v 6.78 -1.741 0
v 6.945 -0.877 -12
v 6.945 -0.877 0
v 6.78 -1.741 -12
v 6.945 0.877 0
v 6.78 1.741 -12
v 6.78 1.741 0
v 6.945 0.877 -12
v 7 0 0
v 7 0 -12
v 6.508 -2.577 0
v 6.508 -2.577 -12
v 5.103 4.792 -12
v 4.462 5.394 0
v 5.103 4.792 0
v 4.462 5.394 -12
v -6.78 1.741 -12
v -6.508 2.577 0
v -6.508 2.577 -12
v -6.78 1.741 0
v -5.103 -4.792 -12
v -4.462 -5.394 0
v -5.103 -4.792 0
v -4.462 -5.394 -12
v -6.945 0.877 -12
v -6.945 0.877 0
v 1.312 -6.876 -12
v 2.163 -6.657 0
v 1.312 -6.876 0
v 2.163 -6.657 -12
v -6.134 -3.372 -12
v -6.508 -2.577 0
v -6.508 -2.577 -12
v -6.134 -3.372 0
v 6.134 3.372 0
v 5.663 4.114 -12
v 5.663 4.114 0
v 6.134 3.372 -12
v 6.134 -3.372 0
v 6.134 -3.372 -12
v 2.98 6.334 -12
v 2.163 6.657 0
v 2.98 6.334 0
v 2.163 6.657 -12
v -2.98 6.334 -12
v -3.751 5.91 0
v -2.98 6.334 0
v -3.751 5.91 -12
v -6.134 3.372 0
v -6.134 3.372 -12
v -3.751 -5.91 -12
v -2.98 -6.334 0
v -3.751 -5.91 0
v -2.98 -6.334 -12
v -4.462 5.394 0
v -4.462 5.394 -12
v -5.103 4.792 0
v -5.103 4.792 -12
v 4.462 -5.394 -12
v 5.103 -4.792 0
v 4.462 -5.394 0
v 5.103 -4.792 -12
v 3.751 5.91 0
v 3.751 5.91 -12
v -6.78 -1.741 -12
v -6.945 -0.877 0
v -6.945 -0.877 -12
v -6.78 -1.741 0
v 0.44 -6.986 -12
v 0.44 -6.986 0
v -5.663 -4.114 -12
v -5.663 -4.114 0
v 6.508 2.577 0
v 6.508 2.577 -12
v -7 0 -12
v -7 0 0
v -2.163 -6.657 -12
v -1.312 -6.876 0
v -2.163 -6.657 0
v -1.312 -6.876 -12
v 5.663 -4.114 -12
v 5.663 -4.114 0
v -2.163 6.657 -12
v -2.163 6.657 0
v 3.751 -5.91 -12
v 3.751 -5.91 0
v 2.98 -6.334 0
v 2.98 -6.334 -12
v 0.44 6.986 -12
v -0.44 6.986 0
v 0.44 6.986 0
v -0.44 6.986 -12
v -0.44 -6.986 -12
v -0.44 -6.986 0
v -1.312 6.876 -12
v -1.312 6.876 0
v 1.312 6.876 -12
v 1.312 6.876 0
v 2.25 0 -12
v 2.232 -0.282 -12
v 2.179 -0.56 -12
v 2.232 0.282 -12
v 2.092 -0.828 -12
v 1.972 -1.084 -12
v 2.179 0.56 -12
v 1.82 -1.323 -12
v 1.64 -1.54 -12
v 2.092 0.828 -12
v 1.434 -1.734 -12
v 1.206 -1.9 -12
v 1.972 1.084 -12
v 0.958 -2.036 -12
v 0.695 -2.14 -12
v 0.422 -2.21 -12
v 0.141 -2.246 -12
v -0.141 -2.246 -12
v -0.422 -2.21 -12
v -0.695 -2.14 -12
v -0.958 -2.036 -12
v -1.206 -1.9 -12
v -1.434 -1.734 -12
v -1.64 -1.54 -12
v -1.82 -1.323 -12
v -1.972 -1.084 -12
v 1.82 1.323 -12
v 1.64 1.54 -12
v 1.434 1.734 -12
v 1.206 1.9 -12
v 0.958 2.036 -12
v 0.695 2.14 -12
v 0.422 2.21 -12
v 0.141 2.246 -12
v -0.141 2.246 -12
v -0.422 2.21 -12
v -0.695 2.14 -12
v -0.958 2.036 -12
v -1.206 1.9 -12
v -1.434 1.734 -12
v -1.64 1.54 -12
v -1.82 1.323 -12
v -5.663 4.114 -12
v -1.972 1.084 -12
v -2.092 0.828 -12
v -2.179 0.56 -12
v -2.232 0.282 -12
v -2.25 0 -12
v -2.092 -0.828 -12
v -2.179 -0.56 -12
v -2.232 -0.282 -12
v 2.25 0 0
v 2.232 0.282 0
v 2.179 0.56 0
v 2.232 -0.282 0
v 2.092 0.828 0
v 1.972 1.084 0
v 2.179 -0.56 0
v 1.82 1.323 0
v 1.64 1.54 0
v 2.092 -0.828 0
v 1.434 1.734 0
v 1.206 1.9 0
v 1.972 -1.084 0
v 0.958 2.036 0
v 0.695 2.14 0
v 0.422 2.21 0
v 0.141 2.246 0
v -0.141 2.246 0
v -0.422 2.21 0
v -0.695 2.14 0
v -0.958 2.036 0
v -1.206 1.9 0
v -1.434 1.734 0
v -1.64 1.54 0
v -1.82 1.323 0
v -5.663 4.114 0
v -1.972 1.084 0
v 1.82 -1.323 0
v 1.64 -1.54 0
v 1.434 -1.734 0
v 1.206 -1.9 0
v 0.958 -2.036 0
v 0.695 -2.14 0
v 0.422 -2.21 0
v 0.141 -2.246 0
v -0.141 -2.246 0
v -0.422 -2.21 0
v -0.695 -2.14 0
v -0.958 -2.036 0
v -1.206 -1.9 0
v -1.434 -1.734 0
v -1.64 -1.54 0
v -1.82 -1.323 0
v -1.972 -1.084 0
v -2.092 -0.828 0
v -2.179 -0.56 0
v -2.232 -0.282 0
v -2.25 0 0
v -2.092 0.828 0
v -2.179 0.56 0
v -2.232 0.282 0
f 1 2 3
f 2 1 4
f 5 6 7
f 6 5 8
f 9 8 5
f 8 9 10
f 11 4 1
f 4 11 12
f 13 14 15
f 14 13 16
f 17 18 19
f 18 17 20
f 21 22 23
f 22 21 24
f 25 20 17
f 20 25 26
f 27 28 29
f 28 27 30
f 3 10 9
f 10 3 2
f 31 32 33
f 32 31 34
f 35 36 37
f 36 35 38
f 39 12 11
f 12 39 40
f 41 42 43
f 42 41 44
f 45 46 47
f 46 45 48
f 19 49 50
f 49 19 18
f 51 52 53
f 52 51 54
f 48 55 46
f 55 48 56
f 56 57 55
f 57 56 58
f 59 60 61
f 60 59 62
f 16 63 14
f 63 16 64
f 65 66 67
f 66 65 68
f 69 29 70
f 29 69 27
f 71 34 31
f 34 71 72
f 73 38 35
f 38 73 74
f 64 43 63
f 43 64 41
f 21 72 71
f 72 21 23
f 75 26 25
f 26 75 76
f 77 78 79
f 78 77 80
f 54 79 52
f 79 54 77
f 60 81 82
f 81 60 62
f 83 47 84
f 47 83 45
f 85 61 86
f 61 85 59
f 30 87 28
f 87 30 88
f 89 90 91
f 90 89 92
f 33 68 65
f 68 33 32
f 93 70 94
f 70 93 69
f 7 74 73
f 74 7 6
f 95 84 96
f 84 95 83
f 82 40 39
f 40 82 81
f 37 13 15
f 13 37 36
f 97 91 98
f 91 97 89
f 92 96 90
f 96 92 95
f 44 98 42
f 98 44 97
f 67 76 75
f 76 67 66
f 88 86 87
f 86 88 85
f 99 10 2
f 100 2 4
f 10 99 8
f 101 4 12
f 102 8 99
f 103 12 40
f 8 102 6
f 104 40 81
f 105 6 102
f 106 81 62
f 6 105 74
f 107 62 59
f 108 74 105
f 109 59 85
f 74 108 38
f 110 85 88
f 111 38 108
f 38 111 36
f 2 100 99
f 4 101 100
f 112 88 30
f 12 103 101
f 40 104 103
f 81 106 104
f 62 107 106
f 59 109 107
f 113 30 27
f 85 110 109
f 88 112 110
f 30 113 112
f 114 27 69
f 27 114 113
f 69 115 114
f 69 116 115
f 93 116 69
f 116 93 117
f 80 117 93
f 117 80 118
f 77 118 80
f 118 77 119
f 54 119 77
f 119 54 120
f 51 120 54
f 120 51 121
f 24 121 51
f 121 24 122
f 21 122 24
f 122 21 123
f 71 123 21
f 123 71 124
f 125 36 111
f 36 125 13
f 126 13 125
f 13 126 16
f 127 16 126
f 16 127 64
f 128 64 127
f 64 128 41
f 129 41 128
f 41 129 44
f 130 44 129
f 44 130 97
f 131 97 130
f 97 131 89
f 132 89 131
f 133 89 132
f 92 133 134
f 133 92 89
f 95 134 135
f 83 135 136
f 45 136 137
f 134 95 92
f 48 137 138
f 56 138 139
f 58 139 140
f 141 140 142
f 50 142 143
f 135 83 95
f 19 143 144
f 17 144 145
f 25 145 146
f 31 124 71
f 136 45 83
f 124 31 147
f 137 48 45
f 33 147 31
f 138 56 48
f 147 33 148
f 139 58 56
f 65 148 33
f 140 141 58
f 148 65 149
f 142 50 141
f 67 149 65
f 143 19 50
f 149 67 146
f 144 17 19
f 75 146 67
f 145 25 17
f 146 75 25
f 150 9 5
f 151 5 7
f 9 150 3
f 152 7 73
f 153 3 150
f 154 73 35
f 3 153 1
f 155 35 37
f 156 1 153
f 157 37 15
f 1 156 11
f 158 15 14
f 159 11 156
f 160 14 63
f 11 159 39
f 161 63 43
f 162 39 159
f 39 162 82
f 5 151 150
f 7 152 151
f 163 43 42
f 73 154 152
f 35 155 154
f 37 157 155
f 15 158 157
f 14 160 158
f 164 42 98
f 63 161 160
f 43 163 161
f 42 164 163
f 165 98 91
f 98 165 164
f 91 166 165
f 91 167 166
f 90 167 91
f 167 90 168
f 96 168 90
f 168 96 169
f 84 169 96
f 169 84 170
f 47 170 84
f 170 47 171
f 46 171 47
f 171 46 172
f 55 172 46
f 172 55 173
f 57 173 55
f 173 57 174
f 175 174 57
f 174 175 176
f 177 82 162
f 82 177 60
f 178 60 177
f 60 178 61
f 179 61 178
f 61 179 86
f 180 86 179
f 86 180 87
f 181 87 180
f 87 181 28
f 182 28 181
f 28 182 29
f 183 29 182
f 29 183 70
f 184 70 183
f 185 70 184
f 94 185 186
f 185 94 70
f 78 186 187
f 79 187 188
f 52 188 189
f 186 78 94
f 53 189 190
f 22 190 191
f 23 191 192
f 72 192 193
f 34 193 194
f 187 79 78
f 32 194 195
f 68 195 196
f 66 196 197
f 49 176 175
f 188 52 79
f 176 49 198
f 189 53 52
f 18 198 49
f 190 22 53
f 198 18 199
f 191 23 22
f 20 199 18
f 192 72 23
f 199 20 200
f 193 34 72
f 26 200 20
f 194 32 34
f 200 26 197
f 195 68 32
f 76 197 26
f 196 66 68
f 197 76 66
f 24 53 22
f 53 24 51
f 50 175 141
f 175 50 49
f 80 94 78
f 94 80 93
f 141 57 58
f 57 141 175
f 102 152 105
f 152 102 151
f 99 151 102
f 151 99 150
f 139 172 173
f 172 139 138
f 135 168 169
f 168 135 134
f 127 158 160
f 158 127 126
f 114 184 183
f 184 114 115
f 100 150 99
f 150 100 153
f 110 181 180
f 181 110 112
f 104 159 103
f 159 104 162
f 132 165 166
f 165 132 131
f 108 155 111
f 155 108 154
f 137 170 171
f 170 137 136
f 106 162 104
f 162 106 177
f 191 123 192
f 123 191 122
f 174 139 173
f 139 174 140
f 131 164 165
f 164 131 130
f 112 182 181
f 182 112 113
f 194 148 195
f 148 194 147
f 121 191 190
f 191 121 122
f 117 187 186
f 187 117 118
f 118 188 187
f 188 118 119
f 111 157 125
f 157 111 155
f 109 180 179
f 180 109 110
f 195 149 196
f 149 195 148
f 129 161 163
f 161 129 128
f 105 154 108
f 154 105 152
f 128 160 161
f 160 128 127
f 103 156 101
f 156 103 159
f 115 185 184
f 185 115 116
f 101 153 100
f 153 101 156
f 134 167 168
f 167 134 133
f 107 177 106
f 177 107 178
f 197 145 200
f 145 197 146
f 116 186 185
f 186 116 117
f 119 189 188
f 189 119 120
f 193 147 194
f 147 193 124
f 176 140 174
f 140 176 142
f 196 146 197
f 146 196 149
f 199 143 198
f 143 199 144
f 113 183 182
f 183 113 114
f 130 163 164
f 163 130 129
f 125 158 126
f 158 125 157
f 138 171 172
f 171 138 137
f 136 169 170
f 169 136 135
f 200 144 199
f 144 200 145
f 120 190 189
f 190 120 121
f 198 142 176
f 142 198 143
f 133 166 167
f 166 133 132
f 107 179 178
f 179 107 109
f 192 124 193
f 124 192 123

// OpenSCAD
$fn = 50;


difference() {
	union() {
		translate(v = [0, 0, -12.0000000000]) {
			cylinder(h = 12, r = 7.0000000000);
		}
		cylinder(h = 0, r = 10.0000000000);
	}
	union() {
		#translate(v = [0, 0, -12]) {
			cylinder(h = 12, r = 2.2500000000);
		}
	}
}
